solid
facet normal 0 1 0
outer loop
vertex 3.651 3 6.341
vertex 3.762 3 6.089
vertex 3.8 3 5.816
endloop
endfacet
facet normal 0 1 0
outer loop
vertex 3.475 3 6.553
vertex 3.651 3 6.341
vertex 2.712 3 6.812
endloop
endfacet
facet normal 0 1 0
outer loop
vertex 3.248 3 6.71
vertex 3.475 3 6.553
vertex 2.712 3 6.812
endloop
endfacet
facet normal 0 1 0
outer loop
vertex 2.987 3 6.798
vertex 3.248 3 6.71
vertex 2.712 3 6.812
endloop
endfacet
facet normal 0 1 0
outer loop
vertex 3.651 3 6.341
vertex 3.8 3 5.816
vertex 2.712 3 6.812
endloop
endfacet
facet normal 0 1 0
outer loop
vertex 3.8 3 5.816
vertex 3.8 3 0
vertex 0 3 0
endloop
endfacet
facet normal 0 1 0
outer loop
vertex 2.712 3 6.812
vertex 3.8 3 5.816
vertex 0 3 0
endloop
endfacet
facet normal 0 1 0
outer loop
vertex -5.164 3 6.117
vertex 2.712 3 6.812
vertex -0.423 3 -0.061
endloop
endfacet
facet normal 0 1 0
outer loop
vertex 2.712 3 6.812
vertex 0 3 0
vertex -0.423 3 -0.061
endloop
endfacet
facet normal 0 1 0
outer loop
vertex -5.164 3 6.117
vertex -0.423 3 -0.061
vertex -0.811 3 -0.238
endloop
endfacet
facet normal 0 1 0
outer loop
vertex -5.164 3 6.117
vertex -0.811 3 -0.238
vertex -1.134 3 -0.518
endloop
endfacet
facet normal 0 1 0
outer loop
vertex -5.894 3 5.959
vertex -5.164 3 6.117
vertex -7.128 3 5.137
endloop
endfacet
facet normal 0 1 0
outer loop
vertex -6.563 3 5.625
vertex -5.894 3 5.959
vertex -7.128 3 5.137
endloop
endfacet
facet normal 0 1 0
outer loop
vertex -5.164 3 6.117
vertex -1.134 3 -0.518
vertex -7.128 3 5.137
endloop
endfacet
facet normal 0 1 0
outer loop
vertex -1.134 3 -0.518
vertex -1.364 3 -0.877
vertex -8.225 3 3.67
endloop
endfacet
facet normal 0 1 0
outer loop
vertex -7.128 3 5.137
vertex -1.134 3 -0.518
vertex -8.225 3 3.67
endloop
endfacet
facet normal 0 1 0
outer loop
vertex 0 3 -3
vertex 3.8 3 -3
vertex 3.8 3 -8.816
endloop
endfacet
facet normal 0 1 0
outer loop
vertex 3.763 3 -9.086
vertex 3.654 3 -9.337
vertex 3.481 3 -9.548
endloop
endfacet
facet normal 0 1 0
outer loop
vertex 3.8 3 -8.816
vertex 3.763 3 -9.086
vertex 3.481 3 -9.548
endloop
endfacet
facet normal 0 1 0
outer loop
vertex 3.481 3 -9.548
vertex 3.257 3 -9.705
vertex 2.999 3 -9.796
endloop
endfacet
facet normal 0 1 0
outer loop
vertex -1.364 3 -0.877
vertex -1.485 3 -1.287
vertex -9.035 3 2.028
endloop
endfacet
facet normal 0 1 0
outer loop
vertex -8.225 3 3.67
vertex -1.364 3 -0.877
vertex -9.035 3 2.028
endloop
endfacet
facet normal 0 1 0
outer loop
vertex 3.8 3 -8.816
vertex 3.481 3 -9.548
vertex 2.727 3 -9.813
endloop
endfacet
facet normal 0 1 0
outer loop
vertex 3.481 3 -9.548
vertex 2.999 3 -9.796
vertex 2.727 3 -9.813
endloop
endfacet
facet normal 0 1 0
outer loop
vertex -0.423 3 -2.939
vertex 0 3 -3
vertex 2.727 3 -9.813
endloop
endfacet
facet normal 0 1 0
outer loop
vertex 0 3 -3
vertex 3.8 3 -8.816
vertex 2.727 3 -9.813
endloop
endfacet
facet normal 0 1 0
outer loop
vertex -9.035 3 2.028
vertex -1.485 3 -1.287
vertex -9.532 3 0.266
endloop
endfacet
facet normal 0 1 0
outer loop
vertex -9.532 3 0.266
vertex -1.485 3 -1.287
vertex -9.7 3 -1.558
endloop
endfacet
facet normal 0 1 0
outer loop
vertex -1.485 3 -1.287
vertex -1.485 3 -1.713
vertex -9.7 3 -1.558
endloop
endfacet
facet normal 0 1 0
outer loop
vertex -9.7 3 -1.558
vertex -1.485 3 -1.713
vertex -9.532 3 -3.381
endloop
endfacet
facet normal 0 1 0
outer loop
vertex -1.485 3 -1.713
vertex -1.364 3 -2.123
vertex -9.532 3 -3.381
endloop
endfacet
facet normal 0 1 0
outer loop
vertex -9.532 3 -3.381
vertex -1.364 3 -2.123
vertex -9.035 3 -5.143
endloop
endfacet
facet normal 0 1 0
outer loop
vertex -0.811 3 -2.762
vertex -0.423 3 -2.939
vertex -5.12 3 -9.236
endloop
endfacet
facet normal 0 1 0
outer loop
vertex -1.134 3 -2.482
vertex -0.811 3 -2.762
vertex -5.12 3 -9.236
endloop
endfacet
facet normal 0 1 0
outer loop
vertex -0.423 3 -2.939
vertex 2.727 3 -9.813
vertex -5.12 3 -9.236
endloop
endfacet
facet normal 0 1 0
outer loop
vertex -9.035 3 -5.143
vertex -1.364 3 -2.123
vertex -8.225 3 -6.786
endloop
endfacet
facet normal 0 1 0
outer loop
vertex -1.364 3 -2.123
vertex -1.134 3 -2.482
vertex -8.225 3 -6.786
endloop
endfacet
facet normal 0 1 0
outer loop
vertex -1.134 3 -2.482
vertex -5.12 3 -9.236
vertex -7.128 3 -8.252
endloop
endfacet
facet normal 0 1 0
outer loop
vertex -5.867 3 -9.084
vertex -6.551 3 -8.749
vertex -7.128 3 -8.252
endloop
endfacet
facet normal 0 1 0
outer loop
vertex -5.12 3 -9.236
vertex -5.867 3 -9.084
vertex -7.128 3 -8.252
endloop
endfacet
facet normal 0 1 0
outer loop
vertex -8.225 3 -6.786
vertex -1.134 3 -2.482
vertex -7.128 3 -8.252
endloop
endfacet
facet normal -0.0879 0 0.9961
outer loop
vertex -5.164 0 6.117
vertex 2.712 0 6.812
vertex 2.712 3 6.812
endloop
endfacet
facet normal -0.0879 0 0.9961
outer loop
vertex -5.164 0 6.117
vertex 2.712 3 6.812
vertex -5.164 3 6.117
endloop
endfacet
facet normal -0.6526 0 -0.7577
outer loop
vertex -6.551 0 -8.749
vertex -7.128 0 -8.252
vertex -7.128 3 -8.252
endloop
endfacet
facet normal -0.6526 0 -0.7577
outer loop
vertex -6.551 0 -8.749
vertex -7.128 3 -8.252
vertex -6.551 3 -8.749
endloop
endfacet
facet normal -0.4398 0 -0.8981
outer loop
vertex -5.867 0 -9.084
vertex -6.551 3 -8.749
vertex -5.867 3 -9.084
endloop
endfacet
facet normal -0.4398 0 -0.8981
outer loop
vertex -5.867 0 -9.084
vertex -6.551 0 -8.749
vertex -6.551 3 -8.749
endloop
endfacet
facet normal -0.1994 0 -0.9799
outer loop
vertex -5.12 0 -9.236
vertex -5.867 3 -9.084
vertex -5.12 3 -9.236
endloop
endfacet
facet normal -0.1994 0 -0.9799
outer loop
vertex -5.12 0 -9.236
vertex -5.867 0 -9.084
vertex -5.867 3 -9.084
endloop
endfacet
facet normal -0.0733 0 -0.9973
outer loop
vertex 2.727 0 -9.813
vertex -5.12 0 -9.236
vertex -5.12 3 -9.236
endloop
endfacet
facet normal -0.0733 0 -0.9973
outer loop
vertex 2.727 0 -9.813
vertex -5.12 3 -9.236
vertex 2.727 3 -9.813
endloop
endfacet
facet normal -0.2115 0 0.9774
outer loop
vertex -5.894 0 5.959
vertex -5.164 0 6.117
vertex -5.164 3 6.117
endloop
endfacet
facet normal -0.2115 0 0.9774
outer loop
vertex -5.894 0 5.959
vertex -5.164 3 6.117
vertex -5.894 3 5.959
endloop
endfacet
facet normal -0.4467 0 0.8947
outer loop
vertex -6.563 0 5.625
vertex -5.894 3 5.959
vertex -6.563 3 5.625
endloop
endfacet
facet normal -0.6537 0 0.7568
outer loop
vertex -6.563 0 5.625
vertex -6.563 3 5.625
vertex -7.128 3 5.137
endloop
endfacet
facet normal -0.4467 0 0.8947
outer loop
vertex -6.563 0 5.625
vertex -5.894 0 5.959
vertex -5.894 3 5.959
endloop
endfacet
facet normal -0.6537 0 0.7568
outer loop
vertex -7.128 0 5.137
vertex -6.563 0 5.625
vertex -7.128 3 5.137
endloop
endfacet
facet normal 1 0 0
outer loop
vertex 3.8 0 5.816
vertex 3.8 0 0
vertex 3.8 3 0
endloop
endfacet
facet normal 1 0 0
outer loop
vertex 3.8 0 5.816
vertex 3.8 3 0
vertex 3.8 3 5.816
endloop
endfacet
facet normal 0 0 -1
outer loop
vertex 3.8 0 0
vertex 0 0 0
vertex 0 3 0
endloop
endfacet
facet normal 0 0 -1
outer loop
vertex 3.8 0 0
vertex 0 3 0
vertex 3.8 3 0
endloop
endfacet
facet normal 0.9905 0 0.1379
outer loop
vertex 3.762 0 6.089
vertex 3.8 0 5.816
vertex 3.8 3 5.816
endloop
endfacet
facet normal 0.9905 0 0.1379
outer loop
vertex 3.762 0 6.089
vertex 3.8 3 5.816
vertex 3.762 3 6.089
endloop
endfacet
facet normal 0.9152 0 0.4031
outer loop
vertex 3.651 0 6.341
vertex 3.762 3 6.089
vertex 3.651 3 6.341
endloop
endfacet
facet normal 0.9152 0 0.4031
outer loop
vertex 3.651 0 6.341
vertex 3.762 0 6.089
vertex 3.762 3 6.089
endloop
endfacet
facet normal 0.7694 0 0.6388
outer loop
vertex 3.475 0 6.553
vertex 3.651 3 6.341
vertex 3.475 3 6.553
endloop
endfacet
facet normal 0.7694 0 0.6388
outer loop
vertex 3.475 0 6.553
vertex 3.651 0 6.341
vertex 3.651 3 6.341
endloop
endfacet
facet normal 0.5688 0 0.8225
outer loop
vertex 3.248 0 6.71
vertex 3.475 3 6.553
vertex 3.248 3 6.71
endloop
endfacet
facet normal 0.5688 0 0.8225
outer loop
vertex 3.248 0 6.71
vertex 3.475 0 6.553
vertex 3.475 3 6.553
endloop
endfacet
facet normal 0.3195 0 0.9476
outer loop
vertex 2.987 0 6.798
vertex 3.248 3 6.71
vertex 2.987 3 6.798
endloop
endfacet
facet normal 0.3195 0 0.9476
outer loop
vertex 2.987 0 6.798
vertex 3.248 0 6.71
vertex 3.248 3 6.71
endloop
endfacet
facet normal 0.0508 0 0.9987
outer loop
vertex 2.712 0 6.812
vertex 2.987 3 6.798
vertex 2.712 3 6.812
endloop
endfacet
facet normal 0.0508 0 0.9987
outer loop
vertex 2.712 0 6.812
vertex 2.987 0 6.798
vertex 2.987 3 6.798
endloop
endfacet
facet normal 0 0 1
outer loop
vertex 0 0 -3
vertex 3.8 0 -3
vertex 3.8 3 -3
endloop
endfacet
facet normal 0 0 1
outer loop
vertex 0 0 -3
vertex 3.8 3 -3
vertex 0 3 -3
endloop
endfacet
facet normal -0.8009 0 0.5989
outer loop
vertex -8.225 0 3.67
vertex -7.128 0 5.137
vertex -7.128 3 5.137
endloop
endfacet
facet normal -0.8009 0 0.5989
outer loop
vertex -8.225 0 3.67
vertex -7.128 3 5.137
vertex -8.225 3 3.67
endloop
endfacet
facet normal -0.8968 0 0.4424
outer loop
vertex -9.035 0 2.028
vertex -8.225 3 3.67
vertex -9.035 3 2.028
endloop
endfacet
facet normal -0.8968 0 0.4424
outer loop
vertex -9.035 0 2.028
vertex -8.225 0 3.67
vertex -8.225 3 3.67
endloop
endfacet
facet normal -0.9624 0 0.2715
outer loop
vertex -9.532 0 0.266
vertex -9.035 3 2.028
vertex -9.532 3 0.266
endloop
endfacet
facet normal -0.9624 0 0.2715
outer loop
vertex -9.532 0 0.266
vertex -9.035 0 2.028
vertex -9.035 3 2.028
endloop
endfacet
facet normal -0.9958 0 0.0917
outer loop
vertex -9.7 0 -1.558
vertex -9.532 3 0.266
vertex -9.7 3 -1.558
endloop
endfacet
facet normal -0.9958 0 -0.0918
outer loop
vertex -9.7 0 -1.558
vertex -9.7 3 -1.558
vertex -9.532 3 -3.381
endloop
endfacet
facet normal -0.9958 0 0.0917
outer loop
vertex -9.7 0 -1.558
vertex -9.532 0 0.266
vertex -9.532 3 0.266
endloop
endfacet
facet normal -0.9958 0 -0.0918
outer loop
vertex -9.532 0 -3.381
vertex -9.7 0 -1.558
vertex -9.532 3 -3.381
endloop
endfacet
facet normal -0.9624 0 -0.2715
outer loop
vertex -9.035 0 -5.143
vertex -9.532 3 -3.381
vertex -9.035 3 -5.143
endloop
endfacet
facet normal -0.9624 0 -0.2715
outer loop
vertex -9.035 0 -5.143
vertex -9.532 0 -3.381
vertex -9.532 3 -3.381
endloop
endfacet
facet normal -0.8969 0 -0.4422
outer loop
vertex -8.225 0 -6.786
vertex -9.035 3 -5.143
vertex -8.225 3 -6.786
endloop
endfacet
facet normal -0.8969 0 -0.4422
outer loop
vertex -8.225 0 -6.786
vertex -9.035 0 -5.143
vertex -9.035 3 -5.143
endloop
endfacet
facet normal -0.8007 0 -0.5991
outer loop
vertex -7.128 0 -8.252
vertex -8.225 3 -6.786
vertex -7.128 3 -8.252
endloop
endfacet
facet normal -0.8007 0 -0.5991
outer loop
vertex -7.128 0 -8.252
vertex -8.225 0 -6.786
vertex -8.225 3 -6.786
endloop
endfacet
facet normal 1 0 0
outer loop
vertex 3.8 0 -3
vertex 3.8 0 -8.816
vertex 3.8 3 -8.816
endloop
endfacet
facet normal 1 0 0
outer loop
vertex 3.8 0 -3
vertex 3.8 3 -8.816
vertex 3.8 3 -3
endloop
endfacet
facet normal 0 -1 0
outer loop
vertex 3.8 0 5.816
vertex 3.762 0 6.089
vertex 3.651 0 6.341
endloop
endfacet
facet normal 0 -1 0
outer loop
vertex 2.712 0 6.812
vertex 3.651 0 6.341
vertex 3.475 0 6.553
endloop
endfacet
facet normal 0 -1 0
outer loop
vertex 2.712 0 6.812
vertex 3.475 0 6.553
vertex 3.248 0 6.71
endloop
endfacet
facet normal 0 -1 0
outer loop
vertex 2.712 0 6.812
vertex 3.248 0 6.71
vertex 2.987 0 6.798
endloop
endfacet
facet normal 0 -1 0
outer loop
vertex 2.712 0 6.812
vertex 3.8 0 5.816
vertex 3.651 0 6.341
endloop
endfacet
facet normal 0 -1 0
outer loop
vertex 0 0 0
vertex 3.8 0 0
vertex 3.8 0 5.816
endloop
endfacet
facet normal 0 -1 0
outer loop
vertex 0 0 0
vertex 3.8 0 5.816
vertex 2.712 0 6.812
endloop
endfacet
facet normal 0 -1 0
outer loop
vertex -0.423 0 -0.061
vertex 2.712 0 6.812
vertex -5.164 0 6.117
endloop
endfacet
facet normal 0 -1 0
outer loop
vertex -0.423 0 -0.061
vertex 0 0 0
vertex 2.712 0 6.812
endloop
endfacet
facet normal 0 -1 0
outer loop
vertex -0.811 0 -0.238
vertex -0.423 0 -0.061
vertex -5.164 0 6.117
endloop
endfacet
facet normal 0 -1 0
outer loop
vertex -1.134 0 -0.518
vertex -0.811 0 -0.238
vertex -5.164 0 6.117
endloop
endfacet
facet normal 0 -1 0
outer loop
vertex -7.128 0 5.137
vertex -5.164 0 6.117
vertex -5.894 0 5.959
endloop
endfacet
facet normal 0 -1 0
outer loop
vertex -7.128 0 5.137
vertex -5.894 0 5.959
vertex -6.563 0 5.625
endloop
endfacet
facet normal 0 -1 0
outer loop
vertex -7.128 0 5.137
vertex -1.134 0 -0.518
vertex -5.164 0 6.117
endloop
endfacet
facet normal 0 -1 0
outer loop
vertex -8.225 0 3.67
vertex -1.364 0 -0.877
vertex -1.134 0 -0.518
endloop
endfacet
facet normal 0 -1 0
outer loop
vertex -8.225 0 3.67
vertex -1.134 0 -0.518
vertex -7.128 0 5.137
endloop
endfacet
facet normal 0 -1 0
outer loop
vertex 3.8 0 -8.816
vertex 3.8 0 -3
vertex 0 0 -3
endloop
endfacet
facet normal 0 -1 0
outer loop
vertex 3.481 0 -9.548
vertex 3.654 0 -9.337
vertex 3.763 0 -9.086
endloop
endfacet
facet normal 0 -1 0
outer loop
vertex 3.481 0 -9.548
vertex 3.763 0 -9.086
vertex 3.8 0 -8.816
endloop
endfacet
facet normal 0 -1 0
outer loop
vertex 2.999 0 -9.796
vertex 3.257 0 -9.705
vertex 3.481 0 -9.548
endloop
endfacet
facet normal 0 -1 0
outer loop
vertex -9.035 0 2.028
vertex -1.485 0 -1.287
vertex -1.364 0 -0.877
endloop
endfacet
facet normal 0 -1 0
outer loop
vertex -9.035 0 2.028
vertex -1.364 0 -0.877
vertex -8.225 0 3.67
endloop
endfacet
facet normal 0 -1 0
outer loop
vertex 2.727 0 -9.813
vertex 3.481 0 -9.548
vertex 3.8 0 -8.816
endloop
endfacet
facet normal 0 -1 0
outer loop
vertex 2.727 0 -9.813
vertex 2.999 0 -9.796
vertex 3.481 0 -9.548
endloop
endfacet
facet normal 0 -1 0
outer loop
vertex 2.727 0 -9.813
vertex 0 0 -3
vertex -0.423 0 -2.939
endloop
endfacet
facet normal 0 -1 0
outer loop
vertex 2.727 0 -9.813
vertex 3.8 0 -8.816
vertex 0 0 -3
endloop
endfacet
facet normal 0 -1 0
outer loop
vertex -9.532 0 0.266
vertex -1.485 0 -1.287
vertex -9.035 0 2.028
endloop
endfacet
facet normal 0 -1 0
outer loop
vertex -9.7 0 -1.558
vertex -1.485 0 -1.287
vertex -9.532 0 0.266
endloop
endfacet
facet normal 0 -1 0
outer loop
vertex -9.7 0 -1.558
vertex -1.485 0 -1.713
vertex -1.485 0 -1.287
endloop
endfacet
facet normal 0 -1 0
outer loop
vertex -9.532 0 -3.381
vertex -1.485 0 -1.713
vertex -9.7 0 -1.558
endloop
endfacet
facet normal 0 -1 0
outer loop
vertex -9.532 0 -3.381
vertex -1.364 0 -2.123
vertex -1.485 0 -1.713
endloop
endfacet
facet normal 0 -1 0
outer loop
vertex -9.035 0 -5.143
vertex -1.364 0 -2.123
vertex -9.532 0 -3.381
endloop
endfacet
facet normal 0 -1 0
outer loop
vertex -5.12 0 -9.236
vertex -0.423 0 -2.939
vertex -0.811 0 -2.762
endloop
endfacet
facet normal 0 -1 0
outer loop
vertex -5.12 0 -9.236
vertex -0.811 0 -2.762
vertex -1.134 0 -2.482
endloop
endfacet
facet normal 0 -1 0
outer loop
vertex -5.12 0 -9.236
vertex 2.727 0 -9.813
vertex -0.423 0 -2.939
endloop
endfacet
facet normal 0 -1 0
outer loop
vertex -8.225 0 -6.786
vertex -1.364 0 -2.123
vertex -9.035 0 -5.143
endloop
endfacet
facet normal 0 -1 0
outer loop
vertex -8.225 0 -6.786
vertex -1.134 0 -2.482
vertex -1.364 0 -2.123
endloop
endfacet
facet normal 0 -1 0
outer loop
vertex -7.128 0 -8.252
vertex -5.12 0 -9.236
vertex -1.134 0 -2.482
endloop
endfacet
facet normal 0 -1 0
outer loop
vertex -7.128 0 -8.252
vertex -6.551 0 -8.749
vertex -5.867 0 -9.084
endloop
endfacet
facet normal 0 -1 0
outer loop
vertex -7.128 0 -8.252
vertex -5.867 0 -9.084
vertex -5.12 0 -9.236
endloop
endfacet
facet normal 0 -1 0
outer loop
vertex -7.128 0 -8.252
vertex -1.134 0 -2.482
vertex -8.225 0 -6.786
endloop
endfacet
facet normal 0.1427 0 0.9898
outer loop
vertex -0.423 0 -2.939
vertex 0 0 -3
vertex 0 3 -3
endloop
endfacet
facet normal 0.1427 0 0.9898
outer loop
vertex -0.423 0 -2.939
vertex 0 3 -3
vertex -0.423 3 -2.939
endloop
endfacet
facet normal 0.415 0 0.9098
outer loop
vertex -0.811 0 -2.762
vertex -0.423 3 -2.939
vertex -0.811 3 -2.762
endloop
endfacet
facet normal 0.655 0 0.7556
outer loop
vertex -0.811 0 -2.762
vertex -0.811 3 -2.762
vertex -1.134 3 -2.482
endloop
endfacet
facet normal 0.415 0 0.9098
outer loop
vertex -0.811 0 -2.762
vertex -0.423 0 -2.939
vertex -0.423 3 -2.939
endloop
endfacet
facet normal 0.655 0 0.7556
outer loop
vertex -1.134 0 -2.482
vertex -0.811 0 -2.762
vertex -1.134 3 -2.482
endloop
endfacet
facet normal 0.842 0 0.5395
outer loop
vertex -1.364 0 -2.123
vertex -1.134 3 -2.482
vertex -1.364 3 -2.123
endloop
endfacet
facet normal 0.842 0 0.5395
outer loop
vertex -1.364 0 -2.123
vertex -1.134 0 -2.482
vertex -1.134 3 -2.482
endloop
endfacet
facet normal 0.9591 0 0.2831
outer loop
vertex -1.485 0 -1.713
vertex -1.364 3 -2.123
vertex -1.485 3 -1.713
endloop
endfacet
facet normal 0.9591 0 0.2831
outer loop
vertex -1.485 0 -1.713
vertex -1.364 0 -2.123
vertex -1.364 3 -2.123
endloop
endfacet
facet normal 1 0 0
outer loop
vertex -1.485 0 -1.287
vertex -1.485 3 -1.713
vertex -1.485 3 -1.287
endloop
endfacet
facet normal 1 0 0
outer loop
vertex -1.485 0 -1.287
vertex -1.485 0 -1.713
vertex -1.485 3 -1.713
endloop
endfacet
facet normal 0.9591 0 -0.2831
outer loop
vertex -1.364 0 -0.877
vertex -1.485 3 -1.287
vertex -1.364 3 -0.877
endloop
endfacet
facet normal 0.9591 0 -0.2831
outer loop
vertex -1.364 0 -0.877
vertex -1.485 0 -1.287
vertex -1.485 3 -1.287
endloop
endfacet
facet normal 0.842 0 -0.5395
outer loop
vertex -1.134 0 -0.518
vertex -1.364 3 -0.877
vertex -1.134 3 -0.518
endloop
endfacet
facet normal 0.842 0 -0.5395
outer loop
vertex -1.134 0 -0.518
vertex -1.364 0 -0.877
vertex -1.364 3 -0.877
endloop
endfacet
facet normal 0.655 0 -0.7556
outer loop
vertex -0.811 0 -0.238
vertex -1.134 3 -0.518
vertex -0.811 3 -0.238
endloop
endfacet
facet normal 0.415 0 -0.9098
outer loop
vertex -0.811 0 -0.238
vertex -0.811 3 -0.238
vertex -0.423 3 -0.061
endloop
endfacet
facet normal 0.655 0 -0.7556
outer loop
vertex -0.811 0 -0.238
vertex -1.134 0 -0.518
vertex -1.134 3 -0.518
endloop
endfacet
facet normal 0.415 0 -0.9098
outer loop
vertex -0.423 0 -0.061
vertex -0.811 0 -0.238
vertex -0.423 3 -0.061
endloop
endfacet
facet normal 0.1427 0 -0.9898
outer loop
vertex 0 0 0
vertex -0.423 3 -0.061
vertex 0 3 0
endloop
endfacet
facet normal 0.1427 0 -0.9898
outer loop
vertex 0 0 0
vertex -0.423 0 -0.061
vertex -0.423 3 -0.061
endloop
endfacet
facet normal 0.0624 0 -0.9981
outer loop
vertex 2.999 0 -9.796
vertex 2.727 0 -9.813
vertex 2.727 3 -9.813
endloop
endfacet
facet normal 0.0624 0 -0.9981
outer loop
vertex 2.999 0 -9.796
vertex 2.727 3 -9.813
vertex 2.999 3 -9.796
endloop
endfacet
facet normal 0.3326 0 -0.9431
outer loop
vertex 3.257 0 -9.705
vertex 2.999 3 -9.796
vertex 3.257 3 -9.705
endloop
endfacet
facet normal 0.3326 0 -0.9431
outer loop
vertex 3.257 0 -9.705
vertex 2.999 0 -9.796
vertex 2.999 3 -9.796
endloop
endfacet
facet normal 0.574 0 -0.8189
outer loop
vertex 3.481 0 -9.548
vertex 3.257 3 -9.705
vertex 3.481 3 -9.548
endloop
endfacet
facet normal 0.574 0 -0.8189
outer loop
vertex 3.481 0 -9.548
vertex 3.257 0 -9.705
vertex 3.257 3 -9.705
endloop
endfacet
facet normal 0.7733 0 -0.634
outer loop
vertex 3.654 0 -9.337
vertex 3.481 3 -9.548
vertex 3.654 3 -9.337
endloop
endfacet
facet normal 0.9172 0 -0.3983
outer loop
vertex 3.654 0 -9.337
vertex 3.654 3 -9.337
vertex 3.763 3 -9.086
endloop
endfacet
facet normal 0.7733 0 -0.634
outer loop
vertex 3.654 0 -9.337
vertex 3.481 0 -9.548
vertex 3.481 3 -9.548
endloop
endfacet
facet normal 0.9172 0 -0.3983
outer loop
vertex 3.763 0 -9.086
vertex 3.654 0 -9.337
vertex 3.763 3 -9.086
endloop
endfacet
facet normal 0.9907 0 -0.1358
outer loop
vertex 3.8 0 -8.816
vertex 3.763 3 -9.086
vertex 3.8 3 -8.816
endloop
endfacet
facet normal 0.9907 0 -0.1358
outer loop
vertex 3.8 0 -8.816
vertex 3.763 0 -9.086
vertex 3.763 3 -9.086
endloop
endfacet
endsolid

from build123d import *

# Parameters (mm, degrees)
BOSS_EXTRUDE1_DEPTH = 3


with BuildPart() as part:
    # Sketch1 → Boss-Extrude1 (new body)
    with BuildSketch(Plane(origin=(0, 0, 0), x_dir=(1, 0, 0), z_dir=(0, 1, 0))):
        with BuildLine():
            Line((0, 0), (3.8, 0))
            Line((3.8, 0), (3.8, -5.815800771))
            ThreePointArc((3.8, -5.815800771), (3.475312858, -6.553332156), (2.712094913, -6.811929626))
            Line((2.712094913, -6.811929626), (-5.163624241, -6.116923376))
            ThreePointArc((-5.163624241, -6.116923376), (-6.238909118, -5.813137084), (-7.128441398, -5.136930013))
            ThreePointArc((-7.128441398, -5.136930013), (-9.7, 1.557713995), (-7.128441398, 8.252358003))
            ThreePointArc((-7.128441398, 8.252358003), (-6.219292824, 8.938259935), (-5.120004532, 9.235880232))
            Line((-5.120004532, 9.235880232), (2.726634816, 9.813105915))
            ThreePointArc((2.726634816, 9.813105915), (3.48067423, 9.548387007), (3.8, 8.815800771))
            Line((3.8, 8.815800771), (3.8, 3))
            Line((3.8, 3), (0, 3))
            ThreePointArc((0, 3), (-1.5, 1.5), (0, 0))
        make_face()
    extrude(amount=BOSS_EXTRUDE1_DEPTH)


solid = part.part
